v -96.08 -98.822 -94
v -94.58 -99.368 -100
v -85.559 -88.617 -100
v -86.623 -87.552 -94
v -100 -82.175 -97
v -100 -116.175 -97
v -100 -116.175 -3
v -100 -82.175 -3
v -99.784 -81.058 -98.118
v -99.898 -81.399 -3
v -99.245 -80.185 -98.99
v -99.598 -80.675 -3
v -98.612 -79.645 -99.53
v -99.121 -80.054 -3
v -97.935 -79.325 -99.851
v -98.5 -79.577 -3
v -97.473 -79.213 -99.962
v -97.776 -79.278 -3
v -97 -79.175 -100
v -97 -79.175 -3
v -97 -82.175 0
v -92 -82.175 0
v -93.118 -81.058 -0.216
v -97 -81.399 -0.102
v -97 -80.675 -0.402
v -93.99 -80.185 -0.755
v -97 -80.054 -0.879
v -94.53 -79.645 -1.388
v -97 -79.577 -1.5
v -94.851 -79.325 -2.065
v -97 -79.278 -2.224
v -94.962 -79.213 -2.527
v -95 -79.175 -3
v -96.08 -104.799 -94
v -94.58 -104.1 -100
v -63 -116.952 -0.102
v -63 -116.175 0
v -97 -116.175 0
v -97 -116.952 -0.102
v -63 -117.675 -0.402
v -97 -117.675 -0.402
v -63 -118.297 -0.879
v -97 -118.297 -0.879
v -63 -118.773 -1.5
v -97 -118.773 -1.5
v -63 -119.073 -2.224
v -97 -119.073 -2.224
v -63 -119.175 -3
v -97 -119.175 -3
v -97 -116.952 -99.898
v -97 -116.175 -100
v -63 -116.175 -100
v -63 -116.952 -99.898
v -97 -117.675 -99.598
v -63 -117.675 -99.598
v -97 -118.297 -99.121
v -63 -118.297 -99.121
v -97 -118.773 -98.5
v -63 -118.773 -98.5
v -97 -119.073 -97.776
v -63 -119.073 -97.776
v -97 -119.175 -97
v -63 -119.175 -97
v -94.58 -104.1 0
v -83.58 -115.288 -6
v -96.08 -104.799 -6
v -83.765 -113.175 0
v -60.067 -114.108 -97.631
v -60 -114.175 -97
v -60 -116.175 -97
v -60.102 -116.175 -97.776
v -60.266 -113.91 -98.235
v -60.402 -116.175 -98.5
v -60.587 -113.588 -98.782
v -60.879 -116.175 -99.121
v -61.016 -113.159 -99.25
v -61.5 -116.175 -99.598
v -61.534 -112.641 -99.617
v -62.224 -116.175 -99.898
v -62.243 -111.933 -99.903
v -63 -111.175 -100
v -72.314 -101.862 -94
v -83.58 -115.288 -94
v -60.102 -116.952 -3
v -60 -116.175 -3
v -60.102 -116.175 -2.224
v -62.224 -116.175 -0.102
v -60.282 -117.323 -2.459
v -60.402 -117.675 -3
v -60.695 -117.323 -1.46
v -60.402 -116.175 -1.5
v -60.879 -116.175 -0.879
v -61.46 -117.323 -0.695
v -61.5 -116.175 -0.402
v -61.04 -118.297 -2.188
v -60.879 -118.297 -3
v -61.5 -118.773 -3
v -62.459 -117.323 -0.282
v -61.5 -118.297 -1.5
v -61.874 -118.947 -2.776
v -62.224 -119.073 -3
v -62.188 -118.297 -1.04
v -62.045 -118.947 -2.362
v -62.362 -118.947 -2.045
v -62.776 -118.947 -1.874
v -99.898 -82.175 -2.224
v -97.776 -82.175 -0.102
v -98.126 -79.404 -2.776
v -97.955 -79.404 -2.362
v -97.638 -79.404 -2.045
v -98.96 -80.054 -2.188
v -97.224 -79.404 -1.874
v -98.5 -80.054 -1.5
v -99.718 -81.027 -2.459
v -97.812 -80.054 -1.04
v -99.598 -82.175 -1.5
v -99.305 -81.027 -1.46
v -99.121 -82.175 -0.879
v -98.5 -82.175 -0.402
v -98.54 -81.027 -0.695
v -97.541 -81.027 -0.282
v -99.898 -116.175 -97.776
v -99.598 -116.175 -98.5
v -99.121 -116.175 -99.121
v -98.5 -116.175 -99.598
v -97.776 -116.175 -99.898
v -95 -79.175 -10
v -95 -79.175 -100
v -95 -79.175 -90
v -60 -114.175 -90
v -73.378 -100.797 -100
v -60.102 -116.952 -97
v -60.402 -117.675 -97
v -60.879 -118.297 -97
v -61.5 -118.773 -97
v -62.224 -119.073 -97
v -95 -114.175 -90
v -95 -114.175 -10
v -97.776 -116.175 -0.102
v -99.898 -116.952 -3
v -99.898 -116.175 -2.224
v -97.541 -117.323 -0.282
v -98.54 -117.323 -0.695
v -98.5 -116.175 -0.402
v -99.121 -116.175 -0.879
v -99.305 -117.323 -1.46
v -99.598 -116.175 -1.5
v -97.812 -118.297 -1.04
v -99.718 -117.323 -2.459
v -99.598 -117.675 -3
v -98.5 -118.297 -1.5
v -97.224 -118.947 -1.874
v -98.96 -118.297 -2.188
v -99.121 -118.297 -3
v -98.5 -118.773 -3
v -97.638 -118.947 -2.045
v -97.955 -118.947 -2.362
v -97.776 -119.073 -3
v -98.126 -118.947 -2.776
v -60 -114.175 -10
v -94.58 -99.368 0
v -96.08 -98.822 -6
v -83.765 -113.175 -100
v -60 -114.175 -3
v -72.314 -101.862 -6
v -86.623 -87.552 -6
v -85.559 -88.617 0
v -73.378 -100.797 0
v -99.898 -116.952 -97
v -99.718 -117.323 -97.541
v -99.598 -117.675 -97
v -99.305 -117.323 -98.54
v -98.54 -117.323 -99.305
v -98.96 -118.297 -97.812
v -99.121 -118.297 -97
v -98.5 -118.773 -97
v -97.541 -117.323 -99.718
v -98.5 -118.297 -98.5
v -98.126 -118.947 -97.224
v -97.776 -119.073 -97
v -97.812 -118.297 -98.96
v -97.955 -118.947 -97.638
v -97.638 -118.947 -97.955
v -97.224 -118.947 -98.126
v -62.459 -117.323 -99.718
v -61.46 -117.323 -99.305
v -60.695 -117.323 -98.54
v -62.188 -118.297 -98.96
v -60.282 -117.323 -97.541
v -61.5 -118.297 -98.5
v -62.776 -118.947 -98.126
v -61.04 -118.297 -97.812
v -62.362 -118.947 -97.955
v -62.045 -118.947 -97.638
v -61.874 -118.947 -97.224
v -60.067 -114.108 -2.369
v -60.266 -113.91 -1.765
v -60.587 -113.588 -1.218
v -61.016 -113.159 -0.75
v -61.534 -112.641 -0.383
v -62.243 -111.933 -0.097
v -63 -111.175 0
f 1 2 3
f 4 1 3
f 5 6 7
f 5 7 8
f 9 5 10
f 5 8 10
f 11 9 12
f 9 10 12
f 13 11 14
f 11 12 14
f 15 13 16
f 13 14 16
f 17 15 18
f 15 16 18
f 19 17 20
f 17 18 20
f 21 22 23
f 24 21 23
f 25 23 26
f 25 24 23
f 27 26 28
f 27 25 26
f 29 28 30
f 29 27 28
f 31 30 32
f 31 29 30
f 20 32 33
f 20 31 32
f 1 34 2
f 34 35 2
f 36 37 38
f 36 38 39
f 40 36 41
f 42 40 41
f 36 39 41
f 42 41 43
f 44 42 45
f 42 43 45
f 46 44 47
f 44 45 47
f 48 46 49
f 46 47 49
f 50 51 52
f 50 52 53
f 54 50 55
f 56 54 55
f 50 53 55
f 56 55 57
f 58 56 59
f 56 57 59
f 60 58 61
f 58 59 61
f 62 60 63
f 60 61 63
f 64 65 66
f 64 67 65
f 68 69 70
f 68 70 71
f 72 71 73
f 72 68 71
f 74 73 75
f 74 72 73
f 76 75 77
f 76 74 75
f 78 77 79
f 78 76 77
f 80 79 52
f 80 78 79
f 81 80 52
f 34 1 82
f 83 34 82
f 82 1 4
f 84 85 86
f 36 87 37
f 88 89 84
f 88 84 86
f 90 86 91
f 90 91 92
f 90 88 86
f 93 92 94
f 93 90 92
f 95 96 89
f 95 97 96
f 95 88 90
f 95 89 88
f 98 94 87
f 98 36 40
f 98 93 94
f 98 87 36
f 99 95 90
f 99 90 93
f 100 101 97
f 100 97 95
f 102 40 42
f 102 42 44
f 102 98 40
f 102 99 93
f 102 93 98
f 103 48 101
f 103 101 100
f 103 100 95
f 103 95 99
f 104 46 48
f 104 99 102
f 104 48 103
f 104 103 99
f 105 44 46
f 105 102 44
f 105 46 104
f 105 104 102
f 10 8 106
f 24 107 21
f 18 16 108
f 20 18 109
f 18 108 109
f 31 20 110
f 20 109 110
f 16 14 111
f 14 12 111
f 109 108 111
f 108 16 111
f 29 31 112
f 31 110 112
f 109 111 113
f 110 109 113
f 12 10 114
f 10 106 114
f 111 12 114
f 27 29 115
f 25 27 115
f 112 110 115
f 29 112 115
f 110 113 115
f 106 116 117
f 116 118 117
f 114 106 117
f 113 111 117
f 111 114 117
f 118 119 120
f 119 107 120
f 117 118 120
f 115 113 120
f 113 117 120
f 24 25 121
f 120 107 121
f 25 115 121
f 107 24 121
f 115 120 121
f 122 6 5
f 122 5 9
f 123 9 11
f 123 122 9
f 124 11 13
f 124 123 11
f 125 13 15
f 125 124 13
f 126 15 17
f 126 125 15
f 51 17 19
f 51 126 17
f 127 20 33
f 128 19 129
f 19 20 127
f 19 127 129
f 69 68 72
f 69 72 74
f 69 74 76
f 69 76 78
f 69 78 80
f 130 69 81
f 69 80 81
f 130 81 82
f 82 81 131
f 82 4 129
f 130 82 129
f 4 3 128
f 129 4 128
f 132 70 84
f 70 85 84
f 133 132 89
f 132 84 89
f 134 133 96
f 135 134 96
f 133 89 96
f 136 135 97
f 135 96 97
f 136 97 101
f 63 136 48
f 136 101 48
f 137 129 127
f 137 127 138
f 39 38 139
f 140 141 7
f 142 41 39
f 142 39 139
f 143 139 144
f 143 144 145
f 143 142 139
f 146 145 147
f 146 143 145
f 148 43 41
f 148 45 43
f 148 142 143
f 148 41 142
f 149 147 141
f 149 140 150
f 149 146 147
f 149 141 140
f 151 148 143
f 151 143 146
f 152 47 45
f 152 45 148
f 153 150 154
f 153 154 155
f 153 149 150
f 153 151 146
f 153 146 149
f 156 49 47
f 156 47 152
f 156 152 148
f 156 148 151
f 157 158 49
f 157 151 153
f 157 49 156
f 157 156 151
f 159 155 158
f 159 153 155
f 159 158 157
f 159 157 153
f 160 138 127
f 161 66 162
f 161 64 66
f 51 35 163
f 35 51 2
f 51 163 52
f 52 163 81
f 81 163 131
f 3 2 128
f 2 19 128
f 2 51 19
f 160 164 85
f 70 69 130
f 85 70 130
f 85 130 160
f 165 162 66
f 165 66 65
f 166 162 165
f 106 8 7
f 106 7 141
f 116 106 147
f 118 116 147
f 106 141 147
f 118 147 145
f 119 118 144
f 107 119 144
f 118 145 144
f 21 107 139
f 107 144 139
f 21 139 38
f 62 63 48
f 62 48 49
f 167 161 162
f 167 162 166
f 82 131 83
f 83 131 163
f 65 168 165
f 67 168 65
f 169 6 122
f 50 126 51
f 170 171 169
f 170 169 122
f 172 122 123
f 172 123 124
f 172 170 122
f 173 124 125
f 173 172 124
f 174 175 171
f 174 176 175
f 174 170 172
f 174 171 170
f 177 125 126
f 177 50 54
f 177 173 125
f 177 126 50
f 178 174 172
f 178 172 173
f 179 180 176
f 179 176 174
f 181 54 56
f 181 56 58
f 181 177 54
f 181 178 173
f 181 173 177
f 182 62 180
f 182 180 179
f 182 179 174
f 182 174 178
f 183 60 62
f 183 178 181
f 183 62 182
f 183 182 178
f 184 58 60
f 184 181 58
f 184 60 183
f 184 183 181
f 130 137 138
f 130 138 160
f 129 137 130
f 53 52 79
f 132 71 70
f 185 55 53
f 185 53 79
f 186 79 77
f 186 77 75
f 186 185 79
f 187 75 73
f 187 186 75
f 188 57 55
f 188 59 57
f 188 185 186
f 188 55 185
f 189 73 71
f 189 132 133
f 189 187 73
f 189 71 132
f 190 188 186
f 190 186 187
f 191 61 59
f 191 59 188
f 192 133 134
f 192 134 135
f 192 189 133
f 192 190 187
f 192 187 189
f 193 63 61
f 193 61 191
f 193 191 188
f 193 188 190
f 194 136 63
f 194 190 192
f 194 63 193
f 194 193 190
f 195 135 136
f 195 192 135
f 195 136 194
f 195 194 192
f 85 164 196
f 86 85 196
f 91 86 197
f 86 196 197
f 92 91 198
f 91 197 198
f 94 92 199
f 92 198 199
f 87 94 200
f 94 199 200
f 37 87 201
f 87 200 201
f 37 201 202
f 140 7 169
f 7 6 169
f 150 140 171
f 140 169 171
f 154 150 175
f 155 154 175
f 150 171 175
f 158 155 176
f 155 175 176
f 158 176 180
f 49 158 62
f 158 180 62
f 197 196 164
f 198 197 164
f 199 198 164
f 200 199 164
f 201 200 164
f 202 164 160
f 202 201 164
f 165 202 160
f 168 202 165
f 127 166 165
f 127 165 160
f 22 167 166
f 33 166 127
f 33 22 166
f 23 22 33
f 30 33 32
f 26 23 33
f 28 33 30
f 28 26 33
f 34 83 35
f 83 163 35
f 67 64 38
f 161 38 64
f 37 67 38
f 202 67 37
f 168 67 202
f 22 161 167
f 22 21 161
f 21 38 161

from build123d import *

# Parameters (mm, degrees)
EXTRUDE_1_DEPTH = 10
EXTRUDE_3_DEPTH = 40
FILLET_2_R      = 3
FILLET_3_R      = 3


with BuildPart() as part:
    # 草图3 → 凸台-拉伸1 (new body)
    with BuildSketch(Plane.XY):
        Polygon((-100, -79.175359259), (-100, -119.175359259), (-60, -119.175359259), (-60, -114.175359259), (-95, -79.175359259), align=None)
    extrude(amount=-EXTRUDE_1_DEPTH)

    # 草图5 → 切除-放样1 section 0
    with BuildSketch(Plane.XY.offset(-6)):
        with BuildLine():
            Line((-96.08, -104.799041882), (-96.08, -98.821989002))
            Line((-96.08, -98.821989002), (-81.709132385, -81.695455893))
            Line((-81.709132385, -81.695455893), (-66.265676412, -94.654054104))
            Line((-66.265676412, -94.654054104), (-83.579668035, -115.288065824))
            Line((-83.579668035, -115.288065824), (-96.08, -104.799041882))
        make_face()
    # 草图8 → 切除-放样1 section 1
    with BuildSketch(Plane.XY):
        with BuildLine():
            Line((-94.58, -104.099580395), (-94.58, -99.367944353))
            Line((-94.58, -99.367944353), (-80.56006572, -82.659637307))
            Line((-80.56006572, -82.659637307), (-67.414743077, -93.68987269))
            Line((-67.414743077, -93.68987269), (-83.764553285, -113.174817744))
            Line((-83.764553285, -113.174817744), (-94.58, -104.099580395))
        make_face()
    loft(mode=Mode.SUBTRACT)

    # 草图9 → 凸台-拉伸3 (add)
    with BuildSketch(Plane(origin=(0, 0, -10), x_dir=(-1, 0, 0), z_dir=(0, 0, -1))):
        Polygon((95, -79.175359259), (95, -114.175359259), (60, -114.175359259), (60, -119.175359259), (100, -119.175359259), (100, -79.175359259), align=None)
    extrude(amount=EXTRUDE_3_DEPTH)

    # 镜向2: part across plane


with BuildPart() as part_1:
    add(part.part)
    add(part.part.mirror(Plane(origin=(0, 0, -50), x_dir=(1, 0, 0), z_dir=(0, 0, -1))))

    # 圆角2
    fillet_2_edges = [part_1.edges().sort_by_distance(p)[0] for p in [
        (-60, -116.675359259, -100),
        (-60, -116.675359259, 0),
        (-100, -99.175359259, -100),
        (-100, -99.175359259, 0),
        (-100, -79.175359259, -50),
        (-97.5, -79.175359259, 0),
    ]]
    fillet(fillet_2_edges, radius=FILLET_2_R)

    # 圆角3
    fillet_3_edges = [part_1.edges().sort_by_distance(p)[0] for p in [
        (-80, -119.175359259, -100),
        (-80, -119.175359259, 0),
        (-100, -119.175359259, -50),
        (-60, -119.175359259, -50),
        (-99.121320344, -119.175359259, -0.878679656),
        (-99.121320344, -119.175359259, -99.121320344),
        (-60.878679656, -119.175359259, -0.878679656),
        (-60.878679656, -119.175359259, -99.121320344),
    ]]
    fillet(fillet_3_edges, radius=FILLET_3_R)


solid = part_1.part
